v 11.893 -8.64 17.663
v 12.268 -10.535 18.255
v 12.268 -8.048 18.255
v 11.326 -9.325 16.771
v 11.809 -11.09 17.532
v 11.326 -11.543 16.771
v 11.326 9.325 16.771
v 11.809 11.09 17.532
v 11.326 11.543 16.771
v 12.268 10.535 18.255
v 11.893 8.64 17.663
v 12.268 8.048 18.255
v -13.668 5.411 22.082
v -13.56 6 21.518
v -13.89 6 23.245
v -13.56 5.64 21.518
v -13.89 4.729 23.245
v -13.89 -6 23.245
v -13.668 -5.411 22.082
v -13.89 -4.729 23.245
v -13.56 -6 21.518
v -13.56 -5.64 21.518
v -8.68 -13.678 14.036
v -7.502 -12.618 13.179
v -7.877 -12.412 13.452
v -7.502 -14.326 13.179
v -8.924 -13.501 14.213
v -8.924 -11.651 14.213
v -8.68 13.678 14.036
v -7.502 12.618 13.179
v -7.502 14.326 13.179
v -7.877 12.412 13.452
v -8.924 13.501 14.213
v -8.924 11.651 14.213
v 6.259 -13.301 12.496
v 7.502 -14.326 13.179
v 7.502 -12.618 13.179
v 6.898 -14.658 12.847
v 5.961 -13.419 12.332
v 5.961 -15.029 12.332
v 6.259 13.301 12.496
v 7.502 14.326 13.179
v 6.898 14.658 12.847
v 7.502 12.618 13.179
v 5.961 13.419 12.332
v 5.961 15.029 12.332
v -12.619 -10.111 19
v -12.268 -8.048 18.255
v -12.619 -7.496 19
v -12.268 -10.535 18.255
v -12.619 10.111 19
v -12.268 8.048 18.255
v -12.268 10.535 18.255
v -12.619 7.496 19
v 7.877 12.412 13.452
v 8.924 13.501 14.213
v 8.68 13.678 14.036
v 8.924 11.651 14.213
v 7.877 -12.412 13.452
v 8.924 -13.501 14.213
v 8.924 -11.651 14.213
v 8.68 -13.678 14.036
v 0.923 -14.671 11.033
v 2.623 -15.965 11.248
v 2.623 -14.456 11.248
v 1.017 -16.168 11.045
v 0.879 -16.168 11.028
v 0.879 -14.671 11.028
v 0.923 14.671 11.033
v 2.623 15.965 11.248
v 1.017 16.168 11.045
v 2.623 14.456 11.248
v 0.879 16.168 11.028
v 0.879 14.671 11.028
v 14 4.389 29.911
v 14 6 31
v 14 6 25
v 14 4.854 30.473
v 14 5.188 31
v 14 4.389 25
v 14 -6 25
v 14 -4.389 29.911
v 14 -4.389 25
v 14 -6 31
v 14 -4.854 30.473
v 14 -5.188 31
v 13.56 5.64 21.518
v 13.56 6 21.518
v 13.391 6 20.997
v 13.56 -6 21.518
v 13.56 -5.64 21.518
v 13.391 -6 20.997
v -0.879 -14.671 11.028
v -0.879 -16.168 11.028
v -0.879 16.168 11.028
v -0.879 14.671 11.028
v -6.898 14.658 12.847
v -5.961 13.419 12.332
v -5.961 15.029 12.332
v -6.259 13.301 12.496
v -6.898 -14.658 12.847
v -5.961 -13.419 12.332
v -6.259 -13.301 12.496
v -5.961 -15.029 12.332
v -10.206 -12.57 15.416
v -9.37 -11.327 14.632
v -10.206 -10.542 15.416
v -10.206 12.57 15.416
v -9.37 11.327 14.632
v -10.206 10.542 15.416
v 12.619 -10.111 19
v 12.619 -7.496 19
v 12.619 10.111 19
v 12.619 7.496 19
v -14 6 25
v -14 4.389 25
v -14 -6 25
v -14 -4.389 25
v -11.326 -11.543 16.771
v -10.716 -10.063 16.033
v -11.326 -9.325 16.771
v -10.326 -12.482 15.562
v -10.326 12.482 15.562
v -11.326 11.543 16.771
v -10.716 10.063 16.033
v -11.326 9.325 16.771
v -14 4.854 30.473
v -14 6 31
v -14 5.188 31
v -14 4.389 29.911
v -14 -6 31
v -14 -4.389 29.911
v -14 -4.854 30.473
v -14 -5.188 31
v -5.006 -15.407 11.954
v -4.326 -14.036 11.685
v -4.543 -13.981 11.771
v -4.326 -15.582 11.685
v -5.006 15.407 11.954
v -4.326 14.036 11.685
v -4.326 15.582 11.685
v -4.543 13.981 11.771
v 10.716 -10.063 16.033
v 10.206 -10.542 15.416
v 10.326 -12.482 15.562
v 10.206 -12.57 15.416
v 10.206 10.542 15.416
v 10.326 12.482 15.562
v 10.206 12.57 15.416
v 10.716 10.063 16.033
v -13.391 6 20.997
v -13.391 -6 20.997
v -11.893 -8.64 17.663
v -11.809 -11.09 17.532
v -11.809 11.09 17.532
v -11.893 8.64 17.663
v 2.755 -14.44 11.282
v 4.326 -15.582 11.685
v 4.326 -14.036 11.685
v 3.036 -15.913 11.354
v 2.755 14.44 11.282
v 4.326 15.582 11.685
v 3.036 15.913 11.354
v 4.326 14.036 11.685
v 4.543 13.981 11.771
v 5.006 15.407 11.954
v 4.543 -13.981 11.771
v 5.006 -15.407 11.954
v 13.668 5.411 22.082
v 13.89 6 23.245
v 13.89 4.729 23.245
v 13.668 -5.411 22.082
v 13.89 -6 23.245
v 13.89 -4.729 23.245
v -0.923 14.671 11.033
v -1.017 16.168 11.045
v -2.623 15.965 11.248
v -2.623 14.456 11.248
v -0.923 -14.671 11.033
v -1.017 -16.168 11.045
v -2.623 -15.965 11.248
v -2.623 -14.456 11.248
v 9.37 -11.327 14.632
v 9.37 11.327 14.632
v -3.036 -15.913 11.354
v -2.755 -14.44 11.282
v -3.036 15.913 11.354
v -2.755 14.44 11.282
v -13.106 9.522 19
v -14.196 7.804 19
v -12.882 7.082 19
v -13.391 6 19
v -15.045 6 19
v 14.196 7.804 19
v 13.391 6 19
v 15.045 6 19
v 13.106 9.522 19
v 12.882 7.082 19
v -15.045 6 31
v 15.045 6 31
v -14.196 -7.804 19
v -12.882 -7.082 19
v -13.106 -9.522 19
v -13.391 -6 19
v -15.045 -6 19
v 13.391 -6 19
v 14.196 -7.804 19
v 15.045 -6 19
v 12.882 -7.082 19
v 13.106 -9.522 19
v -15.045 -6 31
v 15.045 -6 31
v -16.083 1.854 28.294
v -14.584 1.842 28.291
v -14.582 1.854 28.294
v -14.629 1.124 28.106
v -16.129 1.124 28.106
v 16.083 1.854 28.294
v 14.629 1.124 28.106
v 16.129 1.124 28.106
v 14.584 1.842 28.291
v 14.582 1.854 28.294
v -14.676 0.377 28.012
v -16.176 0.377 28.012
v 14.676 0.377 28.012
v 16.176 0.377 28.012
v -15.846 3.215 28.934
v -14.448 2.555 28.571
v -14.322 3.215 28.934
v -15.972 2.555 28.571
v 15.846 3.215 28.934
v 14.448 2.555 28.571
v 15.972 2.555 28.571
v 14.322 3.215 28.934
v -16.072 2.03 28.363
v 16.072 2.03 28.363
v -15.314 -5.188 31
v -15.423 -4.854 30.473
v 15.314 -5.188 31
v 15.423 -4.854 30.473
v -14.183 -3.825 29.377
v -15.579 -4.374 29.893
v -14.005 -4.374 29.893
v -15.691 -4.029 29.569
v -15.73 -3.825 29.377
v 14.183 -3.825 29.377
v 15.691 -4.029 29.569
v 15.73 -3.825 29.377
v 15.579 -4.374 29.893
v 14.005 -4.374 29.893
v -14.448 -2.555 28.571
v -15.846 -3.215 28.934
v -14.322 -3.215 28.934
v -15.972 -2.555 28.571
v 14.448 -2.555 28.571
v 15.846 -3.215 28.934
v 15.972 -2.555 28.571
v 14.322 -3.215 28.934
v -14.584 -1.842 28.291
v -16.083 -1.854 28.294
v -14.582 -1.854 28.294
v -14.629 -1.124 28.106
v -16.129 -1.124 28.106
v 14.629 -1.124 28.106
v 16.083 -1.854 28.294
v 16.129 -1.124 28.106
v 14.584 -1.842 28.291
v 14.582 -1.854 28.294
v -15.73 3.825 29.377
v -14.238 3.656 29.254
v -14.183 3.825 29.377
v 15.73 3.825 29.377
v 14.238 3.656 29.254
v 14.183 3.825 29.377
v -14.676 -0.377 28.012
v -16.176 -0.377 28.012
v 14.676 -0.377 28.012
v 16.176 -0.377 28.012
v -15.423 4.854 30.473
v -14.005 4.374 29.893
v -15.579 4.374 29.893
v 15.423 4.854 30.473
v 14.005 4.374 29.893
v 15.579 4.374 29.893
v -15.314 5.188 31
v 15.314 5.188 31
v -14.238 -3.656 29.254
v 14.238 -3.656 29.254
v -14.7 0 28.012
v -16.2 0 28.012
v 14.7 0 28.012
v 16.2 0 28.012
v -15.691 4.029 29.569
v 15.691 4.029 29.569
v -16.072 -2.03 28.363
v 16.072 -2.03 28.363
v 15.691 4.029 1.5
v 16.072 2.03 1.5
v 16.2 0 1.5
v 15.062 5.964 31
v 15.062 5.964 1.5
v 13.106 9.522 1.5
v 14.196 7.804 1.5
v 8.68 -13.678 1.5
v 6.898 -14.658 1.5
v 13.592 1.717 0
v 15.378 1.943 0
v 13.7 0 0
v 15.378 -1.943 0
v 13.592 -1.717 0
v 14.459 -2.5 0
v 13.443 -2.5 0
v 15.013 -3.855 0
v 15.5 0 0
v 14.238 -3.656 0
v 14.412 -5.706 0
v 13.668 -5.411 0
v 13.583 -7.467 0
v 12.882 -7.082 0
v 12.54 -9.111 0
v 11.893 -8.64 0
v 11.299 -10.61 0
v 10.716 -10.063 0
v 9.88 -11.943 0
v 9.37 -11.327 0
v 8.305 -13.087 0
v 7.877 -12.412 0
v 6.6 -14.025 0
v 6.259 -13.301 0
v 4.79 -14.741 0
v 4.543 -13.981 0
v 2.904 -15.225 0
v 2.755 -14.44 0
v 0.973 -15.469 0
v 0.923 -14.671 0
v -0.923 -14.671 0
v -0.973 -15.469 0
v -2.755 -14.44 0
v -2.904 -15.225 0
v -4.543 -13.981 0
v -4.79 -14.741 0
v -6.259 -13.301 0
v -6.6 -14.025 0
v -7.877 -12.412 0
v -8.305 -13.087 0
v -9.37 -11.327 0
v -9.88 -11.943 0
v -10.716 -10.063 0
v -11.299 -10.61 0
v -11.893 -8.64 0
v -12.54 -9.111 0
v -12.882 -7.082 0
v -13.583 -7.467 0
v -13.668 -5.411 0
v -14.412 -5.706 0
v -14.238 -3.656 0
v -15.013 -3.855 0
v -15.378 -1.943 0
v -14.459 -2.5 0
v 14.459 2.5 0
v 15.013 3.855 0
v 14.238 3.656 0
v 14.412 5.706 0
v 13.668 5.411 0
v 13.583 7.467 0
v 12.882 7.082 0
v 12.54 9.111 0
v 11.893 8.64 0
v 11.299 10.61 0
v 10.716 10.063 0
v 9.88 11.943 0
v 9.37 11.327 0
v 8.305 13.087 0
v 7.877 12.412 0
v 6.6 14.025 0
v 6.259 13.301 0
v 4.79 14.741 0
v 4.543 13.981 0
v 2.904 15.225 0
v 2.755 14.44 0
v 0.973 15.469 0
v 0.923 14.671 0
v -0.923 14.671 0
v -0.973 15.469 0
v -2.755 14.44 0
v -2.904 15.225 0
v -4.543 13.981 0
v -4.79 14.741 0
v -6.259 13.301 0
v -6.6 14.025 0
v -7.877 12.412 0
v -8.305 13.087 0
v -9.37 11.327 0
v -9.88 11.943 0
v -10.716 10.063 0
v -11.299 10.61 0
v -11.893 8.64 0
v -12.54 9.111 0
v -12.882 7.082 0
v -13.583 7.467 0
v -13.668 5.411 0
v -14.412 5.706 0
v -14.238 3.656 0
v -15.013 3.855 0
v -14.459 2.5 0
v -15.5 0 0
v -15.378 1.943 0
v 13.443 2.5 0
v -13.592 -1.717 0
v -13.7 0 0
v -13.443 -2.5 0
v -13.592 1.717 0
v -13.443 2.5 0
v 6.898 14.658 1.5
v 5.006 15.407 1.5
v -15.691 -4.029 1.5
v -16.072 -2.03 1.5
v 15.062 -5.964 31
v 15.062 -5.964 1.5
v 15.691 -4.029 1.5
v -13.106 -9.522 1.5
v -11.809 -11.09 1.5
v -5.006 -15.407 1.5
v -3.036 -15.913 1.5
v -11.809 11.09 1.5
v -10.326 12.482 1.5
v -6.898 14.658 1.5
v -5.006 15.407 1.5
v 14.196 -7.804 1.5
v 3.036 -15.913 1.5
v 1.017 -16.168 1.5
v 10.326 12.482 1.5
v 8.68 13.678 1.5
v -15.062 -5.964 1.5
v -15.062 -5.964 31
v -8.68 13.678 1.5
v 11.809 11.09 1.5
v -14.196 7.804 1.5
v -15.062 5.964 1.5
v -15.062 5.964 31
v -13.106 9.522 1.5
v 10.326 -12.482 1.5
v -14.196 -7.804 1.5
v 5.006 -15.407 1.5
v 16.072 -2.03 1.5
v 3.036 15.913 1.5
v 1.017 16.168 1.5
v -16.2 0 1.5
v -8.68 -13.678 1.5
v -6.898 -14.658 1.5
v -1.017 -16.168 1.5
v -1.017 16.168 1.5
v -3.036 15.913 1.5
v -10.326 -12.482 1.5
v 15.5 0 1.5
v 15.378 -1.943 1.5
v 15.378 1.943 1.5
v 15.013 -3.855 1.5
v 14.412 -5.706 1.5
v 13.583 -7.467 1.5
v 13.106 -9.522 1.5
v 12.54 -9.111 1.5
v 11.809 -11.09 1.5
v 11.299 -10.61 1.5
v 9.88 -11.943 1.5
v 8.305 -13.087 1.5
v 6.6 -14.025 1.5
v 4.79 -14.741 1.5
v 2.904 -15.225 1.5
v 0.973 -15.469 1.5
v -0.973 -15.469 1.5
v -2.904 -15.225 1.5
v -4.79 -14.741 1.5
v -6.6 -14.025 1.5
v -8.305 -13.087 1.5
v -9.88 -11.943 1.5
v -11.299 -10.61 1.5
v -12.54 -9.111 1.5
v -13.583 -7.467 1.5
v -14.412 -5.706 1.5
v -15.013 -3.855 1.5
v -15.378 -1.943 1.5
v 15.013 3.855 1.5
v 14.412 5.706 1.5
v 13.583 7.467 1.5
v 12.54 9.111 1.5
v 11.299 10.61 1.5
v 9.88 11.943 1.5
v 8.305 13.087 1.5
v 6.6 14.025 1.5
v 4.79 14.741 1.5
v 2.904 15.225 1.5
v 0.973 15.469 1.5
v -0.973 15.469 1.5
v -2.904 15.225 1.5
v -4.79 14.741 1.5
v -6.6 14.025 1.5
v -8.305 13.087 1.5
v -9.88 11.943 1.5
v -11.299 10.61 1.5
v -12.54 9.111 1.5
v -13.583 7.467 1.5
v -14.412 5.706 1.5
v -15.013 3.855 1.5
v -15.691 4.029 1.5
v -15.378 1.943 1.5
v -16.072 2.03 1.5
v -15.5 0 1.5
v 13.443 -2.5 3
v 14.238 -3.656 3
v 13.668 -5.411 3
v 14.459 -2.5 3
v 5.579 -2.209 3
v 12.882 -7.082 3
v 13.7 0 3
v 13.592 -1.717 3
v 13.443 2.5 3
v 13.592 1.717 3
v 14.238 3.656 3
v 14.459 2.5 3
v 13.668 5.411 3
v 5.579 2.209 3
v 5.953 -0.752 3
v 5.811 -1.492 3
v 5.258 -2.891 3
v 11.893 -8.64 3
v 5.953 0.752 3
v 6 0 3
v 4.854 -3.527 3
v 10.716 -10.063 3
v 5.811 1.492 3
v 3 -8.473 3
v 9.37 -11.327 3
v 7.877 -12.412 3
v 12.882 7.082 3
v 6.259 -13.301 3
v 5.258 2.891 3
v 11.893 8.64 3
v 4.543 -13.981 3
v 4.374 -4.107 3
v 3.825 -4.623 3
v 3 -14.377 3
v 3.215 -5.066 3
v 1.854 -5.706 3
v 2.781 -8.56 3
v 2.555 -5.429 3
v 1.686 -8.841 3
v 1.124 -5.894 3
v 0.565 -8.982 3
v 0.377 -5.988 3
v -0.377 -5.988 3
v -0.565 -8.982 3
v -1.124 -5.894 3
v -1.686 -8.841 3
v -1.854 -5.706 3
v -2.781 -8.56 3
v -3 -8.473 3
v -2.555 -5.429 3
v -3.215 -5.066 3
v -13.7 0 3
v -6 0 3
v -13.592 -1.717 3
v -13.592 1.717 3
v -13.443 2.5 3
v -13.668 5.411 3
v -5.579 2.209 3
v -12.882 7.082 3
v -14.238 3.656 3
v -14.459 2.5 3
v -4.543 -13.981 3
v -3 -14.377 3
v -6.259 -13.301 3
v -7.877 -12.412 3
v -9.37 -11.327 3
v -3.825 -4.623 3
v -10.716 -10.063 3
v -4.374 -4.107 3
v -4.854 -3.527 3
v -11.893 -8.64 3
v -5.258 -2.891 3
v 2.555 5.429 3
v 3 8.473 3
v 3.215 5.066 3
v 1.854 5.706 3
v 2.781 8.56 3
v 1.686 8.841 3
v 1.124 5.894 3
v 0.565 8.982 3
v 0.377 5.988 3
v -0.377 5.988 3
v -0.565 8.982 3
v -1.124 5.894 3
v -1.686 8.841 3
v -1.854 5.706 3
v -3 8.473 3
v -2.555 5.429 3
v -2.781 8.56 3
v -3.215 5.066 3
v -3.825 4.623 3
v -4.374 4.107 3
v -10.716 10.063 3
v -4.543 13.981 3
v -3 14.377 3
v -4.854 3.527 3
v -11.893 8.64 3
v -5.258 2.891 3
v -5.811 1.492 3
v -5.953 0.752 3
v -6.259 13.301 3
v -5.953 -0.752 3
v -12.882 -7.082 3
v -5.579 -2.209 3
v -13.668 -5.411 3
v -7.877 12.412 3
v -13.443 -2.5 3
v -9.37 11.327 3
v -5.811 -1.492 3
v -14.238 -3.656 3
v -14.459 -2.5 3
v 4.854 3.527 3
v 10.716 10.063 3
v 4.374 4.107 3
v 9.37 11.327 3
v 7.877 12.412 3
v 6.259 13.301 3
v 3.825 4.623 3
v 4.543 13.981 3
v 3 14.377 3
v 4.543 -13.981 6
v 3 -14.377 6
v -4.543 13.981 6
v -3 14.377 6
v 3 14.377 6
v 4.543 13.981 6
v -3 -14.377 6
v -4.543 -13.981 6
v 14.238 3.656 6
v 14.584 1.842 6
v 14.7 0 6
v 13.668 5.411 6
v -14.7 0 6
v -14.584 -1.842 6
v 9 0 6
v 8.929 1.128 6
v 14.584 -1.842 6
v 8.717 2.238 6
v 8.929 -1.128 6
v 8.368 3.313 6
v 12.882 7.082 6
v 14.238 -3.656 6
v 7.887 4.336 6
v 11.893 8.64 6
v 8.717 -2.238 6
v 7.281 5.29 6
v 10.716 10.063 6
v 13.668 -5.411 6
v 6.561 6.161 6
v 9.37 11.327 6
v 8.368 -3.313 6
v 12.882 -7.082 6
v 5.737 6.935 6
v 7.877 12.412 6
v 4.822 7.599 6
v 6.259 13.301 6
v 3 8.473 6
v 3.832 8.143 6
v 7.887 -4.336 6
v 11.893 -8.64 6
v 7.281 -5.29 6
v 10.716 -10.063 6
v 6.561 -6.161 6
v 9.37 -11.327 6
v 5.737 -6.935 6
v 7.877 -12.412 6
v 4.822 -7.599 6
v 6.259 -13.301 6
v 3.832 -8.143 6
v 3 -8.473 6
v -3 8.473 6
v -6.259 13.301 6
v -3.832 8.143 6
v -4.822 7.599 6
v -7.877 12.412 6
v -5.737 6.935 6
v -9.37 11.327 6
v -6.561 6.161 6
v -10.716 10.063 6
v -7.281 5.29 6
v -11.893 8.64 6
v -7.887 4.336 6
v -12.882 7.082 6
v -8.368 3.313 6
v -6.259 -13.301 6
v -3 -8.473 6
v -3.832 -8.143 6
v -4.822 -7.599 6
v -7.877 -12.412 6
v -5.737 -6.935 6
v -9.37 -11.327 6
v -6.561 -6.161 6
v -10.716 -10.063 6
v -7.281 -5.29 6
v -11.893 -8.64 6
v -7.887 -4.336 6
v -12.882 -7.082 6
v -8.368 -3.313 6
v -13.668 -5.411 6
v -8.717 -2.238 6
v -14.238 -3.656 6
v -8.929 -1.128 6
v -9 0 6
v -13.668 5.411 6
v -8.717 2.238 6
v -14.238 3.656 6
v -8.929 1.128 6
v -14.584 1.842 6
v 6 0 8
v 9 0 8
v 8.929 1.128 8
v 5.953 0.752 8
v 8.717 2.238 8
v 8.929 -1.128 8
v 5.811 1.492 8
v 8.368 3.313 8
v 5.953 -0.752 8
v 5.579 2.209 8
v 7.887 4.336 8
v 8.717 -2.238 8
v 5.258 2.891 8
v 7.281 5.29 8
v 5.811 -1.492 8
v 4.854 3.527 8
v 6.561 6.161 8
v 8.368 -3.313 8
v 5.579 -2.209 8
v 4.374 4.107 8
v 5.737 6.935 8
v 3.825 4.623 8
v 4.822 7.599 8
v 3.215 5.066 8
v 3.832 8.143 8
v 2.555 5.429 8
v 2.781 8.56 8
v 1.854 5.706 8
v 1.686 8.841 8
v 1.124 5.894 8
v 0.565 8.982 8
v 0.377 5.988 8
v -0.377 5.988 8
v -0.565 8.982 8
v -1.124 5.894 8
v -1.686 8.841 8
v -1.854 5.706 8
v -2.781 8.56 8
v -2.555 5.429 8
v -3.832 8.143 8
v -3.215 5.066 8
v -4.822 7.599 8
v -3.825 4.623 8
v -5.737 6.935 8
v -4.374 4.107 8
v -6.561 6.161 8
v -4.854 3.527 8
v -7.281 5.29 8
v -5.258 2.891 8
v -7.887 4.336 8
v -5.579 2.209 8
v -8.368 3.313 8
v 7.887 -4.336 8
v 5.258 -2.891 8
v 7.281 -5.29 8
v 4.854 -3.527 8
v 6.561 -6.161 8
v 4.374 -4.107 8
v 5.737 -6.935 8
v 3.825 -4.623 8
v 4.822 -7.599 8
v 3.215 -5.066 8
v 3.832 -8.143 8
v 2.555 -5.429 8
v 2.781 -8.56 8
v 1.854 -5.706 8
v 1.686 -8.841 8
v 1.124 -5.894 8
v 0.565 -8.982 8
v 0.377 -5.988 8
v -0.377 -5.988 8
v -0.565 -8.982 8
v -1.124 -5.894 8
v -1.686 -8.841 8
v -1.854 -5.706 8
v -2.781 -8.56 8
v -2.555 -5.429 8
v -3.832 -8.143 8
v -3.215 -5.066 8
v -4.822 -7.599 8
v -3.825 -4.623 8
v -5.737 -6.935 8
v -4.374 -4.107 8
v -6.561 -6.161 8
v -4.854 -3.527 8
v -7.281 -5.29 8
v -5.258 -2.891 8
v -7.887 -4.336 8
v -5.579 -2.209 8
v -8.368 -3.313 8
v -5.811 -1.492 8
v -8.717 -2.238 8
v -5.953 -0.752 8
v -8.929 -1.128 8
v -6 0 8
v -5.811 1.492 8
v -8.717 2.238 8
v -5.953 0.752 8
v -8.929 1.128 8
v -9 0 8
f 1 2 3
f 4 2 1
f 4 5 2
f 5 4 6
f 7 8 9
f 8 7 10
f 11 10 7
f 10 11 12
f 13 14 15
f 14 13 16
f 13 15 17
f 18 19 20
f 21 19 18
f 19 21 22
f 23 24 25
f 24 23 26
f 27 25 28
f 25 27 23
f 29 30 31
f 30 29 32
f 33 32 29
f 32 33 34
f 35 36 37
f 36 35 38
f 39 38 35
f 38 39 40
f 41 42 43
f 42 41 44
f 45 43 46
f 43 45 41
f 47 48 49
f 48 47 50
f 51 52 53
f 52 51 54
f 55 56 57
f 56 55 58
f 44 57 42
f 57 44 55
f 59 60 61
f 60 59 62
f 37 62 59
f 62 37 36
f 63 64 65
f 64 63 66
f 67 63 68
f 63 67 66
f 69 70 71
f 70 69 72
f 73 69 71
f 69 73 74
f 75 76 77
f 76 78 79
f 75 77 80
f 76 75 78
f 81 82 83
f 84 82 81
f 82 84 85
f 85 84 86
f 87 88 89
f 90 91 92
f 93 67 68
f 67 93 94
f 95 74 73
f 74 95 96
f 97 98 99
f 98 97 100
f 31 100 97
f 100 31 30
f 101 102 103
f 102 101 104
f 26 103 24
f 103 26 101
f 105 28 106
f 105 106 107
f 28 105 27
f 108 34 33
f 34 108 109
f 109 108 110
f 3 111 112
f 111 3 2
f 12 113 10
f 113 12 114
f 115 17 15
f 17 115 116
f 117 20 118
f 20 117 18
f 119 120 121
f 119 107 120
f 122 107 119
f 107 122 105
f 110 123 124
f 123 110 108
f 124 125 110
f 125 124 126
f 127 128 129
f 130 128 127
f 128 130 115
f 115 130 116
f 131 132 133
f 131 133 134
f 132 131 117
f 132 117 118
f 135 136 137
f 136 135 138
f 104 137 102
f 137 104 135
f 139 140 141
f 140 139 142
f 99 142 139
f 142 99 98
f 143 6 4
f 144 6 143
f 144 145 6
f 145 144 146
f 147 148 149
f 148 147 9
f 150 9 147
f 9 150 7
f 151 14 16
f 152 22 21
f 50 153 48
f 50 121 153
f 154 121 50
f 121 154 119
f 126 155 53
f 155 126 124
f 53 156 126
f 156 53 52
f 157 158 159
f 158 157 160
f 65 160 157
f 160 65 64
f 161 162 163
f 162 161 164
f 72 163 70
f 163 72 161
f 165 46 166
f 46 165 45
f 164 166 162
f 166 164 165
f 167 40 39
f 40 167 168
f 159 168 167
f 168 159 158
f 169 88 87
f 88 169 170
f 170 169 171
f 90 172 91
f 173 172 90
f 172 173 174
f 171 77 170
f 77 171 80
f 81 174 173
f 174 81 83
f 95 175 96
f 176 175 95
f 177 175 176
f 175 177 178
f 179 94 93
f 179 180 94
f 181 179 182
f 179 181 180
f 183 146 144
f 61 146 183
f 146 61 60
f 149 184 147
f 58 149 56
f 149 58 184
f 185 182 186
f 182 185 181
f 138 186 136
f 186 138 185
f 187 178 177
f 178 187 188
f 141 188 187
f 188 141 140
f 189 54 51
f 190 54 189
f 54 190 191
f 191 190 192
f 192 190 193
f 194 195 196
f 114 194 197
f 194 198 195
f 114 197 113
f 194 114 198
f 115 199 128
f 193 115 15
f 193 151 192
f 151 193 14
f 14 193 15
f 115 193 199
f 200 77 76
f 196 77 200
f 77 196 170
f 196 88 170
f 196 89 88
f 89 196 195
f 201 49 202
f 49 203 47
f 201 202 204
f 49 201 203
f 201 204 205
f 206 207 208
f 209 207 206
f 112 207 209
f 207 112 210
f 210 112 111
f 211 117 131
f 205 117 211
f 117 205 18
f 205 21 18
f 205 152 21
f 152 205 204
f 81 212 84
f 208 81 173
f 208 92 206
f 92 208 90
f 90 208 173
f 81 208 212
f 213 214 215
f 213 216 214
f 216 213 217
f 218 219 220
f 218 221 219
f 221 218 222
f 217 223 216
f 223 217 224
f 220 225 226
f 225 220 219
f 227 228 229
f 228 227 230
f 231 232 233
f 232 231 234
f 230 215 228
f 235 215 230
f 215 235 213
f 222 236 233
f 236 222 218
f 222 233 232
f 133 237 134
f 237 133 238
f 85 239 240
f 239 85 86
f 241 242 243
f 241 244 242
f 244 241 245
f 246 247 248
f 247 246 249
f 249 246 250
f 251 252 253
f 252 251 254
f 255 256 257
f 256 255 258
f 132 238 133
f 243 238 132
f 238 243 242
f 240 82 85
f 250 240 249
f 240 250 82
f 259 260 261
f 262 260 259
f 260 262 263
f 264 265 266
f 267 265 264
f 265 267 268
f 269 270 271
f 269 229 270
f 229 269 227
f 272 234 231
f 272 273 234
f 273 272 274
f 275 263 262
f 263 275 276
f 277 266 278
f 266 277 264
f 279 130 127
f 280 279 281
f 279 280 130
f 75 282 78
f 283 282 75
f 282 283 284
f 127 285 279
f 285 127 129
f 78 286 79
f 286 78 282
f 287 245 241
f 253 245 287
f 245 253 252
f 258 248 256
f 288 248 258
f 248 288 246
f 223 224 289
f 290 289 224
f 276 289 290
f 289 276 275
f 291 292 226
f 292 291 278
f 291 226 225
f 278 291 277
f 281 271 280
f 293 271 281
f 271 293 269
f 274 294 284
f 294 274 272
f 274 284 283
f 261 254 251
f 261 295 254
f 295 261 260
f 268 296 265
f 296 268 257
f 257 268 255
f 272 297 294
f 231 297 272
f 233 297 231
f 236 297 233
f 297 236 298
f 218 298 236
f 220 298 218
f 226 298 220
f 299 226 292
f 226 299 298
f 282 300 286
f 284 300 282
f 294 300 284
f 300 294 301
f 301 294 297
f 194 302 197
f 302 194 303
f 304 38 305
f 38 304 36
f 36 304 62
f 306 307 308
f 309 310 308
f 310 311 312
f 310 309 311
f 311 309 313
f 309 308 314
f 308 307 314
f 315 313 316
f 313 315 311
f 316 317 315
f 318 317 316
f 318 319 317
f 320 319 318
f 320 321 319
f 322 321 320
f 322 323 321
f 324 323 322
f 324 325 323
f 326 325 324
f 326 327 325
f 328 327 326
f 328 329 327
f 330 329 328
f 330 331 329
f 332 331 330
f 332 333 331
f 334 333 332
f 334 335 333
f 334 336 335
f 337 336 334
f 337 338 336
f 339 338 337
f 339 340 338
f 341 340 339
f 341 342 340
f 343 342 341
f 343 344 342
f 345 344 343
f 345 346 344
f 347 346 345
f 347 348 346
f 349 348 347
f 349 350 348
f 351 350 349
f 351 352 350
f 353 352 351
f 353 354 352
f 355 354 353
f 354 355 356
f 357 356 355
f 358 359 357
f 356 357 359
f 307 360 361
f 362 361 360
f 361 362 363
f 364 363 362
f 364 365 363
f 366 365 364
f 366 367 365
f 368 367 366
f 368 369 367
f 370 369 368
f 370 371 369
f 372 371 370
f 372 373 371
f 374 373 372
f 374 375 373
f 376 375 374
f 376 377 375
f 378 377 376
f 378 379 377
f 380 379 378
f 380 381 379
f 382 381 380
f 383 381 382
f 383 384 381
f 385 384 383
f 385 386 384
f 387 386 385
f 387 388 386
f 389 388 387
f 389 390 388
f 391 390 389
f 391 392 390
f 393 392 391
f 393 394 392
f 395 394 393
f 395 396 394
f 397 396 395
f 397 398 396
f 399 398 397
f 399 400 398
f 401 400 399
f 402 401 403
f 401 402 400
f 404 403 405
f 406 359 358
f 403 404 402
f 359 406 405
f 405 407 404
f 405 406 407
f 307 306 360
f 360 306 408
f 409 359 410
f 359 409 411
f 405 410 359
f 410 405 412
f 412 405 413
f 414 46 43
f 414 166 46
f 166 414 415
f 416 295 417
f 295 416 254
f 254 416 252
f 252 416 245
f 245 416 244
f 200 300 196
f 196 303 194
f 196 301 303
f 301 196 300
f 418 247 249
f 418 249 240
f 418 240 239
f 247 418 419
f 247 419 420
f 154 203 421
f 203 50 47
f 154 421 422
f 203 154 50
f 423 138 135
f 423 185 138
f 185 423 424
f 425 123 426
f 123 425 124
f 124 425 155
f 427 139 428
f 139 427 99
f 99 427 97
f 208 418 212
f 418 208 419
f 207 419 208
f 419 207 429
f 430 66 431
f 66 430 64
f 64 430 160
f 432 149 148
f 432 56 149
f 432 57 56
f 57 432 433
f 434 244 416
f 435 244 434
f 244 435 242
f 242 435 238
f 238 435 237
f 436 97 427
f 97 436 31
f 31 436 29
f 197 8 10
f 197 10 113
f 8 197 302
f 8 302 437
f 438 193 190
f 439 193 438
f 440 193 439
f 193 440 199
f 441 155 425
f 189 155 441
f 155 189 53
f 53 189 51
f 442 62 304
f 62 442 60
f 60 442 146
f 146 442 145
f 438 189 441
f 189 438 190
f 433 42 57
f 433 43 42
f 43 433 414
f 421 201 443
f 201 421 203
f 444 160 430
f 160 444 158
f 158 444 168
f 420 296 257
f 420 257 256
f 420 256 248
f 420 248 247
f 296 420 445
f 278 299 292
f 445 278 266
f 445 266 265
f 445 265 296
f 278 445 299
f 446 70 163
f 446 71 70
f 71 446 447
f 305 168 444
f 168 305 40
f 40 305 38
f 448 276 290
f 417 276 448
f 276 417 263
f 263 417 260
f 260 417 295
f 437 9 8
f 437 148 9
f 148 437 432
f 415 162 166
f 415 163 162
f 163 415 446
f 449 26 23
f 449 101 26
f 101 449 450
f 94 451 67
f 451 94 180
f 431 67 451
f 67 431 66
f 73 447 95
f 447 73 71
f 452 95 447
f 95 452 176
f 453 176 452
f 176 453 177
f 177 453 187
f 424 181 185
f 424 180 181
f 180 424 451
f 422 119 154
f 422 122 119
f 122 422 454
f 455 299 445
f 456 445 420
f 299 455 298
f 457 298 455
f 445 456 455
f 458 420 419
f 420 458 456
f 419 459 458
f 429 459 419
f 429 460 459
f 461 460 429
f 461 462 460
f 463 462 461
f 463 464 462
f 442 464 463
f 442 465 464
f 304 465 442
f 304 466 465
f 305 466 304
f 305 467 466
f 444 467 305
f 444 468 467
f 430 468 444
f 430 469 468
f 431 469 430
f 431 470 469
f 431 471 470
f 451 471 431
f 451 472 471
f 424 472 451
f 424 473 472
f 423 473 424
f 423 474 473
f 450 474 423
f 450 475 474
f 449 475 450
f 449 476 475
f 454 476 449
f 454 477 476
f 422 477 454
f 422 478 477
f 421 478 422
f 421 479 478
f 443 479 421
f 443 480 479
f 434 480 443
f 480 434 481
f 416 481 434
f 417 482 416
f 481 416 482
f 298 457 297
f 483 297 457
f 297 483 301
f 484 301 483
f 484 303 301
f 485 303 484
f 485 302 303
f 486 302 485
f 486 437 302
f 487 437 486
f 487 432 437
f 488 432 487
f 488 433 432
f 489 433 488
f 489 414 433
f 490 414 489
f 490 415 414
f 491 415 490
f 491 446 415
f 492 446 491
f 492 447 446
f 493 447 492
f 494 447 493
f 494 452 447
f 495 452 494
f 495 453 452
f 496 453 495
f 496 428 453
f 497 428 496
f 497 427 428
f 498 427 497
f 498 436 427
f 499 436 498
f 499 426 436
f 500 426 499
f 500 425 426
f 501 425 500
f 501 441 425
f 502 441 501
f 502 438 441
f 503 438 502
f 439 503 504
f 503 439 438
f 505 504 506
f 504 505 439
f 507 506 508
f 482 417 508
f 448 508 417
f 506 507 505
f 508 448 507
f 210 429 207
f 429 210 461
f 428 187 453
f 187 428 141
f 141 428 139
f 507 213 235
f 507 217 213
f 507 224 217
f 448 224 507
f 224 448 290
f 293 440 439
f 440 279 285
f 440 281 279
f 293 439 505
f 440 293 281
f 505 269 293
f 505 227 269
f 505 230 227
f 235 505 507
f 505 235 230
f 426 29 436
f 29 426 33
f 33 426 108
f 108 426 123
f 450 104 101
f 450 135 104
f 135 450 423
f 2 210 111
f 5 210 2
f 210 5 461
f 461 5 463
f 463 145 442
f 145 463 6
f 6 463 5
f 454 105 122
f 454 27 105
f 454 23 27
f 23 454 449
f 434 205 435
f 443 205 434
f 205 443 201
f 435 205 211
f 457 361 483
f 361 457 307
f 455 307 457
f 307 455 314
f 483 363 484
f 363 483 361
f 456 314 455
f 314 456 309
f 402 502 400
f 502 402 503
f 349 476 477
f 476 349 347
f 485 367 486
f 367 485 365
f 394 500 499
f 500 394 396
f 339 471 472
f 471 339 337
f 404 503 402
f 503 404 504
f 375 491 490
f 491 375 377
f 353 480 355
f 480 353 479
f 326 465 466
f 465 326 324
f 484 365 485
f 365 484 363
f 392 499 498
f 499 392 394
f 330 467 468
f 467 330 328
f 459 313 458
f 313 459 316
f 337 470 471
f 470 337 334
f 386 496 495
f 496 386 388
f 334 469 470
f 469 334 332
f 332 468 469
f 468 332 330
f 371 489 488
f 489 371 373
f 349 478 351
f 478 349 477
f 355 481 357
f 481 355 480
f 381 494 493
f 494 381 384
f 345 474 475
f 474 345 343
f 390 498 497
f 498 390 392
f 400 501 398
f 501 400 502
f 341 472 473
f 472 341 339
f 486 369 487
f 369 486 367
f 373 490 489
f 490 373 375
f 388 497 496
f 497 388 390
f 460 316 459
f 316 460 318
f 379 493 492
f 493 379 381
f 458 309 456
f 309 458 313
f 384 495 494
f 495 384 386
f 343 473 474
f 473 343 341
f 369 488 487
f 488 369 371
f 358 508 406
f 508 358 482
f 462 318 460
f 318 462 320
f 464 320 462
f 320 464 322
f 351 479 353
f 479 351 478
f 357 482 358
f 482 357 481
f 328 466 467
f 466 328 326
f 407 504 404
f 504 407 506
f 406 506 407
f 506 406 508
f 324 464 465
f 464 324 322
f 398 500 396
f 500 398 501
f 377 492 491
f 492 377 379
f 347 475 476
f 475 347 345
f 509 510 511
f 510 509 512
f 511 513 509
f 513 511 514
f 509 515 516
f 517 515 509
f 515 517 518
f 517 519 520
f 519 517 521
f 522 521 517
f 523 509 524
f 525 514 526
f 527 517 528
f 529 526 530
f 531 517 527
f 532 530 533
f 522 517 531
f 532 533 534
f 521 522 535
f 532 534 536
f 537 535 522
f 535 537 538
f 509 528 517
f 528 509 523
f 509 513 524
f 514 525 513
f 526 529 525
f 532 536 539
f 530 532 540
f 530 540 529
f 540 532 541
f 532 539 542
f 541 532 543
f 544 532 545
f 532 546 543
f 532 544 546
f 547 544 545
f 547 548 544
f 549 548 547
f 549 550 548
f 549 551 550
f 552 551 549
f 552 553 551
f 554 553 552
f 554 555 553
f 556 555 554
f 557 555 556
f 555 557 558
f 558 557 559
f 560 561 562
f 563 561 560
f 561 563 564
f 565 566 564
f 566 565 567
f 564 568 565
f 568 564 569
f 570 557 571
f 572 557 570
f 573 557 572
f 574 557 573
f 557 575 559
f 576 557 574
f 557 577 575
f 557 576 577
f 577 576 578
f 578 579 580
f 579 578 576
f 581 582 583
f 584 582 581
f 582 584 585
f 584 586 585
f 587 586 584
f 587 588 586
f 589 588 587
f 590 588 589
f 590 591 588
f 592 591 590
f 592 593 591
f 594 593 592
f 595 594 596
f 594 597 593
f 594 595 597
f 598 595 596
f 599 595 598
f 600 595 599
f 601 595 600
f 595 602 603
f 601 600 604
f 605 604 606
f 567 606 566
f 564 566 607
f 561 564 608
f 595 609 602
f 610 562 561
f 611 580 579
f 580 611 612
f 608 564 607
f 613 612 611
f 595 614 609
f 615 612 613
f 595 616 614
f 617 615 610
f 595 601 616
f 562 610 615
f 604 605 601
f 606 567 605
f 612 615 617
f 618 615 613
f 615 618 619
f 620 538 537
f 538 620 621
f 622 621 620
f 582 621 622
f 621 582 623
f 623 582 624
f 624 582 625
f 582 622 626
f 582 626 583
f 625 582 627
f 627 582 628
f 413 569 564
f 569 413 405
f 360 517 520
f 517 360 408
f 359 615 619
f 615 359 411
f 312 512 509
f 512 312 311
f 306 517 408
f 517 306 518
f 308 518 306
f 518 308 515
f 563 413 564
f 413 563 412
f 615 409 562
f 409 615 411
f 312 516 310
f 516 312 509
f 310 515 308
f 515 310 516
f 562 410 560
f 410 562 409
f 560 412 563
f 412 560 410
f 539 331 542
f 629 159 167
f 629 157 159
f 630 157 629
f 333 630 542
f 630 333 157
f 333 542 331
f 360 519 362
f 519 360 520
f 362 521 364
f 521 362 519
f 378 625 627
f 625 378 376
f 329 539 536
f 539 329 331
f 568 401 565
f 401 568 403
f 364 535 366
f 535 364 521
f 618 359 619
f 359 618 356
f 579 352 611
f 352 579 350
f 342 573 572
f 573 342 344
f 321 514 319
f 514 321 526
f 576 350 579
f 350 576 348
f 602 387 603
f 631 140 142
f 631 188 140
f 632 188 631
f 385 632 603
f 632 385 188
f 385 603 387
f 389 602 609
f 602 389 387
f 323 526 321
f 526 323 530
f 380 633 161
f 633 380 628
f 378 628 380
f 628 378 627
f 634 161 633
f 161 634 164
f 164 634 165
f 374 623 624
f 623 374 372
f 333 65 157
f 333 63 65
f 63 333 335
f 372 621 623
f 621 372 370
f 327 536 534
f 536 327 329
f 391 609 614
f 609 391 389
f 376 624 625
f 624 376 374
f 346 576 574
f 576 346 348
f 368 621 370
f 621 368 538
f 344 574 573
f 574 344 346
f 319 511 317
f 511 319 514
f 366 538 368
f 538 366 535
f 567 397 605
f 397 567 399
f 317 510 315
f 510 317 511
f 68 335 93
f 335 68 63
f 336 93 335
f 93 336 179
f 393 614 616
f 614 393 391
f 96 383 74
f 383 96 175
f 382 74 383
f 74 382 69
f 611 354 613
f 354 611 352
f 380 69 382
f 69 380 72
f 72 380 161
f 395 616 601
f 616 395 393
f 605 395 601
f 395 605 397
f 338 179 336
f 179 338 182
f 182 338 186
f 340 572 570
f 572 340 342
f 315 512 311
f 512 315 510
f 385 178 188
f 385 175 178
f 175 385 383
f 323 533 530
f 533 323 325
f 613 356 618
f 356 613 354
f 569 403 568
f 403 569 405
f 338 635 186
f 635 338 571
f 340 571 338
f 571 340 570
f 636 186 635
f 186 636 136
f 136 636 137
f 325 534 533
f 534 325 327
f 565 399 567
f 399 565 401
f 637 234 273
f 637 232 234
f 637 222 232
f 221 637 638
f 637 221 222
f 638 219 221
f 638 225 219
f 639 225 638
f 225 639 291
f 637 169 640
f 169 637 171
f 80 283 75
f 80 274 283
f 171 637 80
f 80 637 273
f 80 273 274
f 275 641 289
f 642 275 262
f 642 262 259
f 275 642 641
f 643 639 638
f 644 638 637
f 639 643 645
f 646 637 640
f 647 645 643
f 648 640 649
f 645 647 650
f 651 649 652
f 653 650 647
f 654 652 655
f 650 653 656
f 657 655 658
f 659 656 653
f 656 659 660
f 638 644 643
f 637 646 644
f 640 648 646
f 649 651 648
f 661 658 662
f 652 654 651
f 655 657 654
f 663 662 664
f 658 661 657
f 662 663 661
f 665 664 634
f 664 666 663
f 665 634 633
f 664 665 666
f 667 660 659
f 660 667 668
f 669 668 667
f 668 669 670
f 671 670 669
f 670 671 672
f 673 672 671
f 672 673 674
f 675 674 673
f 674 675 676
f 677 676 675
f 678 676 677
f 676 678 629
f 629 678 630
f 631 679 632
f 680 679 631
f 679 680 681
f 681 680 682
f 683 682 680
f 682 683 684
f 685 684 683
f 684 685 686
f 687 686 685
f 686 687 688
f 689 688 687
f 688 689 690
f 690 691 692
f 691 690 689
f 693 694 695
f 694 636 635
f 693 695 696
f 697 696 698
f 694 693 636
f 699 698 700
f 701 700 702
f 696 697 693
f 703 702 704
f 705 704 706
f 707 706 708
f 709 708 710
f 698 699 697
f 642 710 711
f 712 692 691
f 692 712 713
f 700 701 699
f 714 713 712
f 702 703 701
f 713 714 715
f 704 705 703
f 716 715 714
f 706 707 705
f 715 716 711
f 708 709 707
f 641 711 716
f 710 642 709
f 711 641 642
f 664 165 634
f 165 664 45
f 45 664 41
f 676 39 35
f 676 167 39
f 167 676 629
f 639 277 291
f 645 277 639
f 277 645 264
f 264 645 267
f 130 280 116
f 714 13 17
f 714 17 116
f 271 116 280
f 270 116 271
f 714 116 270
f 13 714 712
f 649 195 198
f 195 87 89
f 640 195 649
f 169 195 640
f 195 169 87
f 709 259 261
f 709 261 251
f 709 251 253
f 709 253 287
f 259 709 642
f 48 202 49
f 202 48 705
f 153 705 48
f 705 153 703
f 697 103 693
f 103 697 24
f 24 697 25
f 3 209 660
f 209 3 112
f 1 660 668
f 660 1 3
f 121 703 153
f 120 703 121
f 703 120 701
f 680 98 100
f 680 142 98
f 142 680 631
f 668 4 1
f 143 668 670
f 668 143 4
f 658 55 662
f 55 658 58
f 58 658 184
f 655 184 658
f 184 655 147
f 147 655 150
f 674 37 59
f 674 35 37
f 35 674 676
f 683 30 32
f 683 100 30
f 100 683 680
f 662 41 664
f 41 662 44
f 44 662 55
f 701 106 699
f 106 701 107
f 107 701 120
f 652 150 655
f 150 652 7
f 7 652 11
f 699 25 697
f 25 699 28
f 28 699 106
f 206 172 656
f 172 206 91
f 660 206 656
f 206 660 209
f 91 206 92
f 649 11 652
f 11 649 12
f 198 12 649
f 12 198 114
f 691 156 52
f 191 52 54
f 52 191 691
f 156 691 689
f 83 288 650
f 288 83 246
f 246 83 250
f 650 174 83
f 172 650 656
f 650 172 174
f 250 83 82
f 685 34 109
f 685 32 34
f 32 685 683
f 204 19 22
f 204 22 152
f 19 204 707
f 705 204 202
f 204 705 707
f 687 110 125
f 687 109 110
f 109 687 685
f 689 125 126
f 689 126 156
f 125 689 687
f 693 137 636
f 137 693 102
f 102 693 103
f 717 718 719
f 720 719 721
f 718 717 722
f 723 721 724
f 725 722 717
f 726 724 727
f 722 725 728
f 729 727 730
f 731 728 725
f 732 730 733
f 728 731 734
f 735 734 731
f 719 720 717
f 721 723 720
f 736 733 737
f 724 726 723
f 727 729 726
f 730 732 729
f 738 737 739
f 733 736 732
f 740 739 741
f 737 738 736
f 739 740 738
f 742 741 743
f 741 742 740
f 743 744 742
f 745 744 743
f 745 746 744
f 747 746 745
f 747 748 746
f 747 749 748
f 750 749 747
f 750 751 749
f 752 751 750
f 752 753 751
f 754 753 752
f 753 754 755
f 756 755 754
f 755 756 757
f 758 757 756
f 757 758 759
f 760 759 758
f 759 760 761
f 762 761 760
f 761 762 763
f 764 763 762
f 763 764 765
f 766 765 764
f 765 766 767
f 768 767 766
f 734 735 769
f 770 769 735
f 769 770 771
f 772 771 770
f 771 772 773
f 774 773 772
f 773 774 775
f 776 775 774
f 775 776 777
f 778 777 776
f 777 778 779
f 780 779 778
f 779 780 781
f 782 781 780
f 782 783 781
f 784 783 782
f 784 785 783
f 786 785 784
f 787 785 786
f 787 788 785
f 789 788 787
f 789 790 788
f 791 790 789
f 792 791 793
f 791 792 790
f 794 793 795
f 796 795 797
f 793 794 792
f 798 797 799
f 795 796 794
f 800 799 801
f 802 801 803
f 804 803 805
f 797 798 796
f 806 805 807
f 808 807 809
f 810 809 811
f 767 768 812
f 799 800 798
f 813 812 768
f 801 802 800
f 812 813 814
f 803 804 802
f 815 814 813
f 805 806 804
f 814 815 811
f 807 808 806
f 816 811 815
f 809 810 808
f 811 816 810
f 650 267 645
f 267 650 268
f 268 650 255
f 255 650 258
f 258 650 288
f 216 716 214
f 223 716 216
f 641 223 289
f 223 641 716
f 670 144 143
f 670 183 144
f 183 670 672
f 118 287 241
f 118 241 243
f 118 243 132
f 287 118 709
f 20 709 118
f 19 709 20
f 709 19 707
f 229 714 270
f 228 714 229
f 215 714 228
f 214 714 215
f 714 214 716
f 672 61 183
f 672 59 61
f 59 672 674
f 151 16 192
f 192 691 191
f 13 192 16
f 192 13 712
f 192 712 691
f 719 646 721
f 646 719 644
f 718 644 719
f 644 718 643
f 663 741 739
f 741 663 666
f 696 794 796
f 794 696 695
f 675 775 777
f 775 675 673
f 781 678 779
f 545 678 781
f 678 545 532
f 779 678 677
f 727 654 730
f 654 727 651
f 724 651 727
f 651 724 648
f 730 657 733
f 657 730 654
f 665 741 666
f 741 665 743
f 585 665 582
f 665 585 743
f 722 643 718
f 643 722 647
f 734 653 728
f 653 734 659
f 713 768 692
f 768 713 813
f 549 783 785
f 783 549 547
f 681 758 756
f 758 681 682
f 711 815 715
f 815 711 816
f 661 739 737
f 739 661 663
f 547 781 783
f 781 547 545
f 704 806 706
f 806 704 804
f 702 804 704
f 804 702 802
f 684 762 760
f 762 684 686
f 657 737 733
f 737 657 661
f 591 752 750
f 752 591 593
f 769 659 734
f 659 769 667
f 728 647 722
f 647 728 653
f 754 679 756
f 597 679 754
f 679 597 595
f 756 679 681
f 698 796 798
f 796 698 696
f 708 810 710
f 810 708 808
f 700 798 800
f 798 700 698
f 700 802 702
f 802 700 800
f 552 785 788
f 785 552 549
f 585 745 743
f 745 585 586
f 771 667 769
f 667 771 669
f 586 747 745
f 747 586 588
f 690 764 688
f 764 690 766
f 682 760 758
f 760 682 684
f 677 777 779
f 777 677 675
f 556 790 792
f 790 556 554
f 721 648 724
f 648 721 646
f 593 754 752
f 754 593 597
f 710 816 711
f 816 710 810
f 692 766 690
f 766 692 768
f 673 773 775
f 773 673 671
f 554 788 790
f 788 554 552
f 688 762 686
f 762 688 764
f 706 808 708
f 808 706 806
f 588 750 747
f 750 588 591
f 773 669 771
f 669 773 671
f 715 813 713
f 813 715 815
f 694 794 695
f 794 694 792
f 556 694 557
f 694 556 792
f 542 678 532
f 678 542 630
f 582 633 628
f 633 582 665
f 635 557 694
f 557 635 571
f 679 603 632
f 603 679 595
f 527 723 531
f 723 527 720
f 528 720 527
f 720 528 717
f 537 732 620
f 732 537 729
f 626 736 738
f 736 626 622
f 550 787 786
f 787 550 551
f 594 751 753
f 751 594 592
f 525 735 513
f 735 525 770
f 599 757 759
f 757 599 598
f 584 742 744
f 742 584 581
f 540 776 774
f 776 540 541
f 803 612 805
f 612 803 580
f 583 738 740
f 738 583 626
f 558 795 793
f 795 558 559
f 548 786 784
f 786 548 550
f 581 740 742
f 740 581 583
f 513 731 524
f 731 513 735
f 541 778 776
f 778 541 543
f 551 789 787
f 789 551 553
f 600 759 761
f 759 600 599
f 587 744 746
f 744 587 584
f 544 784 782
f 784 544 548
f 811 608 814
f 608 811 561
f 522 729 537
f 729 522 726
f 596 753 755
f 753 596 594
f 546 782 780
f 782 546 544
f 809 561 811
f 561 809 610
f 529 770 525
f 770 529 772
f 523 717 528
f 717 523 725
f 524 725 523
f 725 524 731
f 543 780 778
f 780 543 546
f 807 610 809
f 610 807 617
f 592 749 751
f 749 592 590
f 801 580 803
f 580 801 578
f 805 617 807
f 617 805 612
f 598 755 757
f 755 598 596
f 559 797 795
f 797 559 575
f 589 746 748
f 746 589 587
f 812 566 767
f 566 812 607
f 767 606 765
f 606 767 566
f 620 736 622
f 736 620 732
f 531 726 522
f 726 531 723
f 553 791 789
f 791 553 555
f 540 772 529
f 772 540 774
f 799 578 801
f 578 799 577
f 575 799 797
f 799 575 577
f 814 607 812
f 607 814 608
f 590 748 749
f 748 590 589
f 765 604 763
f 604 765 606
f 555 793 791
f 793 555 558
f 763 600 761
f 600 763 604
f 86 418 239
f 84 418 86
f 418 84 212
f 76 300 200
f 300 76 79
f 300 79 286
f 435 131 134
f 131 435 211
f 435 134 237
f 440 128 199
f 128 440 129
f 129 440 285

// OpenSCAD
HEIGHT = 31;
DIA = 32.4;
WALL_THICKNESS = 1.5;

LIP_DIA = 31;
LIP_SMALL_HEIGHT = 1.5;
LIP_HEIGHT = 3;
LIP_THICKNESS = 0.8;

LIP_NUB_WIDTH = 5;
LIP_NUB_THICKNESS = 2.5;

HOLE_INNER_DIA = 12;
HOLE_OUTER_DIA = 18;
HOLE_HEIGHT = 5;

BASE_HEIGHT = 3;
BASE_SLOT_WIDTH = 6;

CUTOUT_1_HEIGHT = 11;
CUTOUT_1_DIA = 28;

CUTOUT_2_HEIGHT = 28;
CUTOUT_2_DIA = 12;

SIDES_HEIGHT = 19;

$fn = 50;

module cutout(dia, height) {
    translate([0, 0, height + dia/2])
    rotate([90, 0, 0])
    cylinder(d = dia, h = DIA * 2, center = true);
}

module body_neg() {
    union() {
        hull() {
            cutout(CUTOUT_1_DIA, CUTOUT_1_HEIGHT);
            translate([0, 0, CUTOUT_1_HEIGHT])
            cutout(CUTOUT_1_DIA, CUTOUT_1_HEIGHT);
        }

        translate([0, DIA/2 + CUTOUT_2_DIA/2, SIDES_HEIGHT + HEIGHT/2])
        cube(size = [DIA, DIA, HEIGHT], center = true);

        translate([0, -DIA/2 - CUTOUT_2_DIA/2, SIDES_HEIGHT + HEIGHT/2])
        cube(size = [DIA, DIA, HEIGHT], center = true);

        rotate([0, 0, 90])
        cutout(CUTOUT_2_DIA, CUTOUT_2_HEIGHT);
    }
}

module lip_neg() {
    union() {
        difference() {
            cylinder(d = DIA, h = LIP_SMALL_HEIGHT);
            cylinder(d = DIA - 2 * (WALL_THICKNESS - LIP_THICKNESS), h = LIP_HEIGHT);
        }
        difference() {
            cylinder(d = DIA - 2 * WALL_THICKNESS, h = LIP_HEIGHT);
            difference() {
                cube(size = [DIA, LIP_NUB_WIDTH, LIP_HEIGHT * 2], center = true);
                cylinder(d = DIA - 2 * LIP_NUB_THICKNESS, h = LIP_HEIGHT);
            }
        }
    }
}

module hole_neg() {
    union() {
        cylinder(d = HOLE_INNER_DIA, h = HEIGHT);

        d = DIA - 2 * WALL_THICKNESS;
        translate([0, 0, HOLE_HEIGHT + LIP_HEIGHT])
        cylinder(d = d, h = HEIGHT);

        translate([0, 0, BASE_HEIGHT + LIP_HEIGHT])
        difference() {
            h = HOLE_HEIGHT - BASE_HEIGHT;
            cylinder(d = d, h = h);
            cylinder(d = HOLE_OUTER_DIA, h = h);
        }
        difference() {
            intersection() {
                cube(size = [BASE_SLOT_WIDTH, d, (BASE_HEIGHT + LIP_HEIGHT)* 2], center = true);
                cylinder(d = d, h = (BASE_HEIGHT + LIP_HEIGHT) * 2);
            }
            cylinder(d = HOLE_OUTER_DIA, h = BASE_HEIGHT + LIP_HEIGHT);
        }
    }
}

difference() {
    cylinder(d = DIA, h = HEIGHT);

    body_neg();
    lip_neg();
    hole_neg();
}
